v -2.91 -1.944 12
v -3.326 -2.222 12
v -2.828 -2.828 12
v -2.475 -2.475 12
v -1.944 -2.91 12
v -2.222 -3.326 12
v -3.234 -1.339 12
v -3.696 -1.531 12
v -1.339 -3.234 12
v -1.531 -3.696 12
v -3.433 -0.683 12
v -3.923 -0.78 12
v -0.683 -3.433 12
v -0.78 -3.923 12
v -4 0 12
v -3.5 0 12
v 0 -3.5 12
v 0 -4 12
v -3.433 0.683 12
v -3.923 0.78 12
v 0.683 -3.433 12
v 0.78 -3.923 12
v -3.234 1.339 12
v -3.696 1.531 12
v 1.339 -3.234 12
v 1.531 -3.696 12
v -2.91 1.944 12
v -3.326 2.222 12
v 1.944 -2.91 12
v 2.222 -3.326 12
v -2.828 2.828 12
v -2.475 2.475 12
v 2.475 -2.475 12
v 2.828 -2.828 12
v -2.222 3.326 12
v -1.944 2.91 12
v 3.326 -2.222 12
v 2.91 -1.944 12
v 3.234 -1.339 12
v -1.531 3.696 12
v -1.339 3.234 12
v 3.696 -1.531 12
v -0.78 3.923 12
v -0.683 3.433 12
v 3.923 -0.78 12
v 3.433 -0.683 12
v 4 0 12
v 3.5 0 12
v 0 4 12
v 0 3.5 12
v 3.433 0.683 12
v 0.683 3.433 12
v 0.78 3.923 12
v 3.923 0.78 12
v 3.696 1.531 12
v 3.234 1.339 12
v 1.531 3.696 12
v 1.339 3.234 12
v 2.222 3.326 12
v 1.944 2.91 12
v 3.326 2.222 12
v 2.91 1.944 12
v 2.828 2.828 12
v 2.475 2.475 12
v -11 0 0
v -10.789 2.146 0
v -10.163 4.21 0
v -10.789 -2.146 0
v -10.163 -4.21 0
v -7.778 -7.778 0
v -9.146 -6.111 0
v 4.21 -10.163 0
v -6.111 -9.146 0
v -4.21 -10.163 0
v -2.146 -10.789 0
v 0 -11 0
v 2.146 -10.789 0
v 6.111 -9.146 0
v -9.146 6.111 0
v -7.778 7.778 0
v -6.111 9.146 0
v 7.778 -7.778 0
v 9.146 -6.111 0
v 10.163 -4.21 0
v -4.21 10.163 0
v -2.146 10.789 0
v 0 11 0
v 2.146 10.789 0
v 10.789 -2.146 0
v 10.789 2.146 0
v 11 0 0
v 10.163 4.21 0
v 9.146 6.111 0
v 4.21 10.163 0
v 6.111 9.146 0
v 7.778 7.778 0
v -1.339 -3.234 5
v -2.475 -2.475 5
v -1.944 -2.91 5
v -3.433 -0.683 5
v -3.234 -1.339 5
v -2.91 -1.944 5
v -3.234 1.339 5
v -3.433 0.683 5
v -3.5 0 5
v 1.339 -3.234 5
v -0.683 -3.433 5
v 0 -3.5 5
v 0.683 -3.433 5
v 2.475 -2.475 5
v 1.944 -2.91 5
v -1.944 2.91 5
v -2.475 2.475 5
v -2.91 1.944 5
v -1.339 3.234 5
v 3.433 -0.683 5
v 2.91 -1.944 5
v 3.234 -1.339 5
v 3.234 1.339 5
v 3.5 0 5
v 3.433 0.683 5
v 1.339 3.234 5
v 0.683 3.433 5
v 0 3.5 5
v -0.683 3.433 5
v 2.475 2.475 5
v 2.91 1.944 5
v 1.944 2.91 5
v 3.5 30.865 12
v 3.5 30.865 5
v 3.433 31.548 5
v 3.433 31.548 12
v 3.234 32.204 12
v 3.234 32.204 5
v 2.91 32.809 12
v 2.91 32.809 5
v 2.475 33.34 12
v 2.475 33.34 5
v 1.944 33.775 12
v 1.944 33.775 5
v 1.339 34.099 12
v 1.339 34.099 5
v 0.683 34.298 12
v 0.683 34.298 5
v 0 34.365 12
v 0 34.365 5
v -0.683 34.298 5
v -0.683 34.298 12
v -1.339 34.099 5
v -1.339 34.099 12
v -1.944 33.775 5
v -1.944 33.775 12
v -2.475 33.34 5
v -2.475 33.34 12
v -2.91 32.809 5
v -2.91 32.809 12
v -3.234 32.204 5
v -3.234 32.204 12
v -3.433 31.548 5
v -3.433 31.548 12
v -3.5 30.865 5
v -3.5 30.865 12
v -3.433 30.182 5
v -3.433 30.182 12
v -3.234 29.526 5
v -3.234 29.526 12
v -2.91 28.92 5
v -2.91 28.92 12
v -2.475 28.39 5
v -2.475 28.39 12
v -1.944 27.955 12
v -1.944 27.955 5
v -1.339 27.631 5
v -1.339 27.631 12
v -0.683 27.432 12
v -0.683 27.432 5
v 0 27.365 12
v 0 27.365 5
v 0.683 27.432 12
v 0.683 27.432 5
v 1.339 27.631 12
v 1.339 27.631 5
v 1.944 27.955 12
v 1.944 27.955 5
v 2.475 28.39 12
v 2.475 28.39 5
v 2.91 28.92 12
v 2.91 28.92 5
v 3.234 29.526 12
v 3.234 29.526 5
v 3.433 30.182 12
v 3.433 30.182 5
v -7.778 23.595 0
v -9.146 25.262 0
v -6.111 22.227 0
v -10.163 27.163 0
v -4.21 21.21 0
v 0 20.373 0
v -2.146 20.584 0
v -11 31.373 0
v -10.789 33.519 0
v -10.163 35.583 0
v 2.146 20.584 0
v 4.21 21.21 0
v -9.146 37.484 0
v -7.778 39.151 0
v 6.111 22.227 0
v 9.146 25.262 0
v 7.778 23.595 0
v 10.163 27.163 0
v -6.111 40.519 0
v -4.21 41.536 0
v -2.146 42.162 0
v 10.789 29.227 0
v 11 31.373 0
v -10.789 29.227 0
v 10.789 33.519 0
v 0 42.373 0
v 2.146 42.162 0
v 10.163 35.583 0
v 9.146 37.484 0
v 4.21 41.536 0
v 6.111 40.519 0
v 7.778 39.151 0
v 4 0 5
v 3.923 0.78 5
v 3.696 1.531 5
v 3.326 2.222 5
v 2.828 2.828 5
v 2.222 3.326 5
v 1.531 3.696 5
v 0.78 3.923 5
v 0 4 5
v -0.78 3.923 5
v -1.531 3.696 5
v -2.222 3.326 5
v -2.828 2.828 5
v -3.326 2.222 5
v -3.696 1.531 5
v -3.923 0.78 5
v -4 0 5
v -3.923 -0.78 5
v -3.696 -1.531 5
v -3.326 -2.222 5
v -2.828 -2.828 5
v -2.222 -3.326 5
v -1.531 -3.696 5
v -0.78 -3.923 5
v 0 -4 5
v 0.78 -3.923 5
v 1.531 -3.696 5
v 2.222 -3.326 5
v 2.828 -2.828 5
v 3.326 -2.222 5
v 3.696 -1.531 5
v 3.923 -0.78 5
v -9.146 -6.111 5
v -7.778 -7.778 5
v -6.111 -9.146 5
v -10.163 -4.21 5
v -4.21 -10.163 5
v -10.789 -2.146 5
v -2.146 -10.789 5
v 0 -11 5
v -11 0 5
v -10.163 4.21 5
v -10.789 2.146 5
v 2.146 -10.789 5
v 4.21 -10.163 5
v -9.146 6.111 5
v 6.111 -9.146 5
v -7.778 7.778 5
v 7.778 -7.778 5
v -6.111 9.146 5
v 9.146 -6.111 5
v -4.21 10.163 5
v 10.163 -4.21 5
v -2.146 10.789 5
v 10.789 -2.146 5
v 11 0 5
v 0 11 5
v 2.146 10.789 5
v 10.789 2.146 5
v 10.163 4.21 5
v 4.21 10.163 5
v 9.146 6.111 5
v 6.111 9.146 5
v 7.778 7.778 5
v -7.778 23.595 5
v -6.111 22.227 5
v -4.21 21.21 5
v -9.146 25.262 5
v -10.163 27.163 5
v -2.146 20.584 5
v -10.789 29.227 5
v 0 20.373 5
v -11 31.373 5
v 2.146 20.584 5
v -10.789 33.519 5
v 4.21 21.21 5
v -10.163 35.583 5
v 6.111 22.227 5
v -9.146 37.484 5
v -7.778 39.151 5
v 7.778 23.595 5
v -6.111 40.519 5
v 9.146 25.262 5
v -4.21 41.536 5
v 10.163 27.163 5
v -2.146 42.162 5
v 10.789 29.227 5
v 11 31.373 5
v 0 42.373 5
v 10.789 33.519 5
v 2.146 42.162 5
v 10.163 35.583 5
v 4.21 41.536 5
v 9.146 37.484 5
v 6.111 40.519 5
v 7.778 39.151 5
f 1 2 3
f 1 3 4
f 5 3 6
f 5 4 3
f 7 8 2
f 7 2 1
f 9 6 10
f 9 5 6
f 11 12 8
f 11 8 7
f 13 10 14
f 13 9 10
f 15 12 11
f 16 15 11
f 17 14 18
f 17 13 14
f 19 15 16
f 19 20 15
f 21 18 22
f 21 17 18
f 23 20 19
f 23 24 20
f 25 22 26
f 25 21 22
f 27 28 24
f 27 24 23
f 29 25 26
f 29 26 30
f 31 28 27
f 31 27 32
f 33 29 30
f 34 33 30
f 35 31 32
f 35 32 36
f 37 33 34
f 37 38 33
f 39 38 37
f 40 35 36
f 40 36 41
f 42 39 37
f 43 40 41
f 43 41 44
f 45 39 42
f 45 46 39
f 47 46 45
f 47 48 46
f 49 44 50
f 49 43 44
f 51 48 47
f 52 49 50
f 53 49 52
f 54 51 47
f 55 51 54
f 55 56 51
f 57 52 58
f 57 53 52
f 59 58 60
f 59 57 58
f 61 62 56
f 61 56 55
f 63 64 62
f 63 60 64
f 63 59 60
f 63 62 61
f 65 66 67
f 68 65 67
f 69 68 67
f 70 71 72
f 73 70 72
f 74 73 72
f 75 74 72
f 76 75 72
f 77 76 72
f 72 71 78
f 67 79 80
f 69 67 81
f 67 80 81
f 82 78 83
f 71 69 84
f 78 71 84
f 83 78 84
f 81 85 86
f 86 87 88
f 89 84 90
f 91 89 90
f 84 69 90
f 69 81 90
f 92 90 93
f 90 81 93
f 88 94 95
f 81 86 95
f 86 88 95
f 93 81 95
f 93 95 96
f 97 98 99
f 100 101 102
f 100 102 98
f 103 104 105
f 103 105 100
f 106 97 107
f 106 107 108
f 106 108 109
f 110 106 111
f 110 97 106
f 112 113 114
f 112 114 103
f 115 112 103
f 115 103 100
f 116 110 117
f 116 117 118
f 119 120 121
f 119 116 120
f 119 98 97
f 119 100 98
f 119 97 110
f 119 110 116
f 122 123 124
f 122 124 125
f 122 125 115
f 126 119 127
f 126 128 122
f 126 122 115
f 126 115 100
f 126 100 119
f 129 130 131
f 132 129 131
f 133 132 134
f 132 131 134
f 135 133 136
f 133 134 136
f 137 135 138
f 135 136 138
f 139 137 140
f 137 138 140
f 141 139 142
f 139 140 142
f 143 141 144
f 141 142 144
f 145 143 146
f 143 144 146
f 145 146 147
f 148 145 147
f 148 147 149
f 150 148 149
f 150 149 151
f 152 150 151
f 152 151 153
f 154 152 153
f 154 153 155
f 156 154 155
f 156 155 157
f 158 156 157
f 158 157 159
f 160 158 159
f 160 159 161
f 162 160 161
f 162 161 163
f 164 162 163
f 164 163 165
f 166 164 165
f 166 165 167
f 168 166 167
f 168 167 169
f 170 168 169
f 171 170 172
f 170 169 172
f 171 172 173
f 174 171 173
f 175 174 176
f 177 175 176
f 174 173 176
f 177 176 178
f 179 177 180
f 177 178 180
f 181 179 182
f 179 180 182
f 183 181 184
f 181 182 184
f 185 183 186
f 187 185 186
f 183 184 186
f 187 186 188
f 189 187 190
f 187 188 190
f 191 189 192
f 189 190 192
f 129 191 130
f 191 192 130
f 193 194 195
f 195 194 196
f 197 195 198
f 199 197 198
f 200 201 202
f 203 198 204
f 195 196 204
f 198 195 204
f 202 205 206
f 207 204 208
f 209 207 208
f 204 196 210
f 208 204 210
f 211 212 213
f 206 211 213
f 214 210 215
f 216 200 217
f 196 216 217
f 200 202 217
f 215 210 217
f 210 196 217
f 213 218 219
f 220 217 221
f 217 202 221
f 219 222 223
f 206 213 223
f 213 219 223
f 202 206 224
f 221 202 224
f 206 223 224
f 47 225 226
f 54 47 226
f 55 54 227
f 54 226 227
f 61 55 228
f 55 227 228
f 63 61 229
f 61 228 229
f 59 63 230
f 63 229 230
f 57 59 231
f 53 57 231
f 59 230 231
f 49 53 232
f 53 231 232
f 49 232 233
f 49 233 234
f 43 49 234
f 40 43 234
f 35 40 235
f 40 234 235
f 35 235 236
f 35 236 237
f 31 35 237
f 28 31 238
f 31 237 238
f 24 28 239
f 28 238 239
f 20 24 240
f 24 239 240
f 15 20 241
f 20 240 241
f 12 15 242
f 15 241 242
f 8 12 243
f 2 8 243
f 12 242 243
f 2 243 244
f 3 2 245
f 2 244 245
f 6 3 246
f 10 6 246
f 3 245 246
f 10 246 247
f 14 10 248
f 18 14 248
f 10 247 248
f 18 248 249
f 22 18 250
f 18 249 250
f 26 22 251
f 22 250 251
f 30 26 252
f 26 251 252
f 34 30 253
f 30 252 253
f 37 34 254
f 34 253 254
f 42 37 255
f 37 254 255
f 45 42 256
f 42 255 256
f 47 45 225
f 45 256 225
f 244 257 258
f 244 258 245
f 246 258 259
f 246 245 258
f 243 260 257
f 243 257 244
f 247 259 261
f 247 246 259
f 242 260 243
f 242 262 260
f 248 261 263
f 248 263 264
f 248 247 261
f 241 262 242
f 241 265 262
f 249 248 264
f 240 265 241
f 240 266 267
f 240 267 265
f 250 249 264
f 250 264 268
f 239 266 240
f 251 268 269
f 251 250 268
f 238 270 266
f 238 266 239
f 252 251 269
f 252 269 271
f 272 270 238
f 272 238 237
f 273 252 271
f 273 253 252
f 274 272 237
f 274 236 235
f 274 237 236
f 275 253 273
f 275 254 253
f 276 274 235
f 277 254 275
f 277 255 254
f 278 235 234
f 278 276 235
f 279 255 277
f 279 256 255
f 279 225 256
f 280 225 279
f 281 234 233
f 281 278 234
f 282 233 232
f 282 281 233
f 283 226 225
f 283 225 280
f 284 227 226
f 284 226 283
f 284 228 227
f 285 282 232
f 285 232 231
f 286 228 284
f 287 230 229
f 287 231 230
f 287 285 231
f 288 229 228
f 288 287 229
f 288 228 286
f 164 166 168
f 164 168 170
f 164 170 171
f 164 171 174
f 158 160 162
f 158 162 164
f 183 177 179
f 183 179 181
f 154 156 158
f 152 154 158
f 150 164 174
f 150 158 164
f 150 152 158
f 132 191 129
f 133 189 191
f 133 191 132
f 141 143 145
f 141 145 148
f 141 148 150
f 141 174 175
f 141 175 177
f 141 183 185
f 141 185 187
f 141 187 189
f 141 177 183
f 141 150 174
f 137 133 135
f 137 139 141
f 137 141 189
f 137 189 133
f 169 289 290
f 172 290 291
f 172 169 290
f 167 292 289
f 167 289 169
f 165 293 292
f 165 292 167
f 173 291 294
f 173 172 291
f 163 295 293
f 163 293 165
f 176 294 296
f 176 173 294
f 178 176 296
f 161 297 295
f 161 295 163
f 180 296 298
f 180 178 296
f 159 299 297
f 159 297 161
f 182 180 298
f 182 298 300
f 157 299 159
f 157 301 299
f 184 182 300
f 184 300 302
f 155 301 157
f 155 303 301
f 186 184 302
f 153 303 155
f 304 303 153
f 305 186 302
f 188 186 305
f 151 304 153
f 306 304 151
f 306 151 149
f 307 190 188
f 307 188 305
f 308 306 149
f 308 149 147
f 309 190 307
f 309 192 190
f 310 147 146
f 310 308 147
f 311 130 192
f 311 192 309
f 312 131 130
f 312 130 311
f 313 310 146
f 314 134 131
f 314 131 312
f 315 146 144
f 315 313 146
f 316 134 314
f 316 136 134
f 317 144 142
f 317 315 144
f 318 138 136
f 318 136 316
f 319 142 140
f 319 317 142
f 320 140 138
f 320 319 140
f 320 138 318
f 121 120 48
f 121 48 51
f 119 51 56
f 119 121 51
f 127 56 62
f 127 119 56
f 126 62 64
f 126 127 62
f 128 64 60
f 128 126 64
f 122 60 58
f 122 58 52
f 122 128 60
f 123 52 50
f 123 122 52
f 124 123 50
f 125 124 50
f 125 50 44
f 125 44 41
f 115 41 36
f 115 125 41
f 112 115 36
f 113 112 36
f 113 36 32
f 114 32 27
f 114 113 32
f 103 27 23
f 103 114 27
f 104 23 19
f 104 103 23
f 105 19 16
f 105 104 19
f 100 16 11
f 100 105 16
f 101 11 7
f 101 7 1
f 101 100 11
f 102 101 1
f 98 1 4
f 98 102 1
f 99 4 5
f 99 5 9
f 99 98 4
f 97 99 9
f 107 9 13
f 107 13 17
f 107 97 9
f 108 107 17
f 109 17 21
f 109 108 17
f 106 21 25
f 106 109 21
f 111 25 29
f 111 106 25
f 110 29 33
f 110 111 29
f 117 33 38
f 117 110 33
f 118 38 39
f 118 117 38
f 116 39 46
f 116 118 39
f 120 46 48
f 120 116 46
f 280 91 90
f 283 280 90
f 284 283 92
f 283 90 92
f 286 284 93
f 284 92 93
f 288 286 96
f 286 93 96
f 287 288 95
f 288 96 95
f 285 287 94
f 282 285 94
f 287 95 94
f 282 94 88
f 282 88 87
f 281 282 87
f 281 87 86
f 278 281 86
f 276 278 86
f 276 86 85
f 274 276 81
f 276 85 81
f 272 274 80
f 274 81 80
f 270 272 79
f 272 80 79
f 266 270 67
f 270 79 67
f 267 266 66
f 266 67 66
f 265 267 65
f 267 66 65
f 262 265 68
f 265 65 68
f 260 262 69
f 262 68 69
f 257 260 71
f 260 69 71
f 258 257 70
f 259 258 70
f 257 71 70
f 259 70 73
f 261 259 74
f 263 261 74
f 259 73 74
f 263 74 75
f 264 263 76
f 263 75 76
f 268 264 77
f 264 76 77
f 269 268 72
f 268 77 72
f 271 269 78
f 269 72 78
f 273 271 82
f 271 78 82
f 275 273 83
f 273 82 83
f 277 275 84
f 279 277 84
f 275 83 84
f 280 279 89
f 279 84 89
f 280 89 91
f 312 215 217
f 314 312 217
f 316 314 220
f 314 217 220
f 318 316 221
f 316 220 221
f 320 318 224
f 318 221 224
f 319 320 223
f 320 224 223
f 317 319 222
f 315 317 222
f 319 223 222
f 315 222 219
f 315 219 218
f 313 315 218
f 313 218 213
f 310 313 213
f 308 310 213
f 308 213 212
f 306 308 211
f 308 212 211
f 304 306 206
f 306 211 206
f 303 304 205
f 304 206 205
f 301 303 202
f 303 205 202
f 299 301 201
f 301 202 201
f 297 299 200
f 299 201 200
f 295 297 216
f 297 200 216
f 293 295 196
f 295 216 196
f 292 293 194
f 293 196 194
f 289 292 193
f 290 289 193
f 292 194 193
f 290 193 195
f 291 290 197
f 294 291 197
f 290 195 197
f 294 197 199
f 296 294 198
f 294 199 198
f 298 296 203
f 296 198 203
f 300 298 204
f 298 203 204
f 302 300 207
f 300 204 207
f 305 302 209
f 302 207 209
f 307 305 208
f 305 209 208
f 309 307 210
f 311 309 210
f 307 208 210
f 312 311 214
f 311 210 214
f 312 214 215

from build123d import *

# Parameters (mm, degrees)
F0_R     = 11
F1_DEPTH = 5
F2_R     = 4
F2_R_2   = 3.5
F3_DEPTH = 7
F4_R     = 11
F5_DEPTH = 5
F6_R     = 3.5
F7_DEPTH = 12


with BuildPart() as f1:
    # F0 (on Top) → F1 (new body)
    with BuildSketch(Plane.XY):
        Circle(F0_R)
    extrude(amount=F1_DEPTH)

    # F2 (on face) → F3 (join)
    with BuildSketch(Plane.XY.offset(5)):
        Circle(F2_R)
        Circle(F2_R_2, mode=Mode.SUBTRACT)
    extrude(amount=F3_DEPTH)


with BuildPart() as f5:
    # F4 (on Top) → F5 (new body)
    with BuildSketch(Plane.XY):
        with Locations((0, 31.372987)):
            Circle(F4_R)
    extrude(amount=F5_DEPTH)

    # F6 (on Top) → F7 (join)
    with BuildSketch(Plane.XY):
        with Locations((0, 30.864922)):
            Circle(F6_R)
    extrude(amount=F7_DEPTH)


solid = Compound([f1.part, f5.part])
